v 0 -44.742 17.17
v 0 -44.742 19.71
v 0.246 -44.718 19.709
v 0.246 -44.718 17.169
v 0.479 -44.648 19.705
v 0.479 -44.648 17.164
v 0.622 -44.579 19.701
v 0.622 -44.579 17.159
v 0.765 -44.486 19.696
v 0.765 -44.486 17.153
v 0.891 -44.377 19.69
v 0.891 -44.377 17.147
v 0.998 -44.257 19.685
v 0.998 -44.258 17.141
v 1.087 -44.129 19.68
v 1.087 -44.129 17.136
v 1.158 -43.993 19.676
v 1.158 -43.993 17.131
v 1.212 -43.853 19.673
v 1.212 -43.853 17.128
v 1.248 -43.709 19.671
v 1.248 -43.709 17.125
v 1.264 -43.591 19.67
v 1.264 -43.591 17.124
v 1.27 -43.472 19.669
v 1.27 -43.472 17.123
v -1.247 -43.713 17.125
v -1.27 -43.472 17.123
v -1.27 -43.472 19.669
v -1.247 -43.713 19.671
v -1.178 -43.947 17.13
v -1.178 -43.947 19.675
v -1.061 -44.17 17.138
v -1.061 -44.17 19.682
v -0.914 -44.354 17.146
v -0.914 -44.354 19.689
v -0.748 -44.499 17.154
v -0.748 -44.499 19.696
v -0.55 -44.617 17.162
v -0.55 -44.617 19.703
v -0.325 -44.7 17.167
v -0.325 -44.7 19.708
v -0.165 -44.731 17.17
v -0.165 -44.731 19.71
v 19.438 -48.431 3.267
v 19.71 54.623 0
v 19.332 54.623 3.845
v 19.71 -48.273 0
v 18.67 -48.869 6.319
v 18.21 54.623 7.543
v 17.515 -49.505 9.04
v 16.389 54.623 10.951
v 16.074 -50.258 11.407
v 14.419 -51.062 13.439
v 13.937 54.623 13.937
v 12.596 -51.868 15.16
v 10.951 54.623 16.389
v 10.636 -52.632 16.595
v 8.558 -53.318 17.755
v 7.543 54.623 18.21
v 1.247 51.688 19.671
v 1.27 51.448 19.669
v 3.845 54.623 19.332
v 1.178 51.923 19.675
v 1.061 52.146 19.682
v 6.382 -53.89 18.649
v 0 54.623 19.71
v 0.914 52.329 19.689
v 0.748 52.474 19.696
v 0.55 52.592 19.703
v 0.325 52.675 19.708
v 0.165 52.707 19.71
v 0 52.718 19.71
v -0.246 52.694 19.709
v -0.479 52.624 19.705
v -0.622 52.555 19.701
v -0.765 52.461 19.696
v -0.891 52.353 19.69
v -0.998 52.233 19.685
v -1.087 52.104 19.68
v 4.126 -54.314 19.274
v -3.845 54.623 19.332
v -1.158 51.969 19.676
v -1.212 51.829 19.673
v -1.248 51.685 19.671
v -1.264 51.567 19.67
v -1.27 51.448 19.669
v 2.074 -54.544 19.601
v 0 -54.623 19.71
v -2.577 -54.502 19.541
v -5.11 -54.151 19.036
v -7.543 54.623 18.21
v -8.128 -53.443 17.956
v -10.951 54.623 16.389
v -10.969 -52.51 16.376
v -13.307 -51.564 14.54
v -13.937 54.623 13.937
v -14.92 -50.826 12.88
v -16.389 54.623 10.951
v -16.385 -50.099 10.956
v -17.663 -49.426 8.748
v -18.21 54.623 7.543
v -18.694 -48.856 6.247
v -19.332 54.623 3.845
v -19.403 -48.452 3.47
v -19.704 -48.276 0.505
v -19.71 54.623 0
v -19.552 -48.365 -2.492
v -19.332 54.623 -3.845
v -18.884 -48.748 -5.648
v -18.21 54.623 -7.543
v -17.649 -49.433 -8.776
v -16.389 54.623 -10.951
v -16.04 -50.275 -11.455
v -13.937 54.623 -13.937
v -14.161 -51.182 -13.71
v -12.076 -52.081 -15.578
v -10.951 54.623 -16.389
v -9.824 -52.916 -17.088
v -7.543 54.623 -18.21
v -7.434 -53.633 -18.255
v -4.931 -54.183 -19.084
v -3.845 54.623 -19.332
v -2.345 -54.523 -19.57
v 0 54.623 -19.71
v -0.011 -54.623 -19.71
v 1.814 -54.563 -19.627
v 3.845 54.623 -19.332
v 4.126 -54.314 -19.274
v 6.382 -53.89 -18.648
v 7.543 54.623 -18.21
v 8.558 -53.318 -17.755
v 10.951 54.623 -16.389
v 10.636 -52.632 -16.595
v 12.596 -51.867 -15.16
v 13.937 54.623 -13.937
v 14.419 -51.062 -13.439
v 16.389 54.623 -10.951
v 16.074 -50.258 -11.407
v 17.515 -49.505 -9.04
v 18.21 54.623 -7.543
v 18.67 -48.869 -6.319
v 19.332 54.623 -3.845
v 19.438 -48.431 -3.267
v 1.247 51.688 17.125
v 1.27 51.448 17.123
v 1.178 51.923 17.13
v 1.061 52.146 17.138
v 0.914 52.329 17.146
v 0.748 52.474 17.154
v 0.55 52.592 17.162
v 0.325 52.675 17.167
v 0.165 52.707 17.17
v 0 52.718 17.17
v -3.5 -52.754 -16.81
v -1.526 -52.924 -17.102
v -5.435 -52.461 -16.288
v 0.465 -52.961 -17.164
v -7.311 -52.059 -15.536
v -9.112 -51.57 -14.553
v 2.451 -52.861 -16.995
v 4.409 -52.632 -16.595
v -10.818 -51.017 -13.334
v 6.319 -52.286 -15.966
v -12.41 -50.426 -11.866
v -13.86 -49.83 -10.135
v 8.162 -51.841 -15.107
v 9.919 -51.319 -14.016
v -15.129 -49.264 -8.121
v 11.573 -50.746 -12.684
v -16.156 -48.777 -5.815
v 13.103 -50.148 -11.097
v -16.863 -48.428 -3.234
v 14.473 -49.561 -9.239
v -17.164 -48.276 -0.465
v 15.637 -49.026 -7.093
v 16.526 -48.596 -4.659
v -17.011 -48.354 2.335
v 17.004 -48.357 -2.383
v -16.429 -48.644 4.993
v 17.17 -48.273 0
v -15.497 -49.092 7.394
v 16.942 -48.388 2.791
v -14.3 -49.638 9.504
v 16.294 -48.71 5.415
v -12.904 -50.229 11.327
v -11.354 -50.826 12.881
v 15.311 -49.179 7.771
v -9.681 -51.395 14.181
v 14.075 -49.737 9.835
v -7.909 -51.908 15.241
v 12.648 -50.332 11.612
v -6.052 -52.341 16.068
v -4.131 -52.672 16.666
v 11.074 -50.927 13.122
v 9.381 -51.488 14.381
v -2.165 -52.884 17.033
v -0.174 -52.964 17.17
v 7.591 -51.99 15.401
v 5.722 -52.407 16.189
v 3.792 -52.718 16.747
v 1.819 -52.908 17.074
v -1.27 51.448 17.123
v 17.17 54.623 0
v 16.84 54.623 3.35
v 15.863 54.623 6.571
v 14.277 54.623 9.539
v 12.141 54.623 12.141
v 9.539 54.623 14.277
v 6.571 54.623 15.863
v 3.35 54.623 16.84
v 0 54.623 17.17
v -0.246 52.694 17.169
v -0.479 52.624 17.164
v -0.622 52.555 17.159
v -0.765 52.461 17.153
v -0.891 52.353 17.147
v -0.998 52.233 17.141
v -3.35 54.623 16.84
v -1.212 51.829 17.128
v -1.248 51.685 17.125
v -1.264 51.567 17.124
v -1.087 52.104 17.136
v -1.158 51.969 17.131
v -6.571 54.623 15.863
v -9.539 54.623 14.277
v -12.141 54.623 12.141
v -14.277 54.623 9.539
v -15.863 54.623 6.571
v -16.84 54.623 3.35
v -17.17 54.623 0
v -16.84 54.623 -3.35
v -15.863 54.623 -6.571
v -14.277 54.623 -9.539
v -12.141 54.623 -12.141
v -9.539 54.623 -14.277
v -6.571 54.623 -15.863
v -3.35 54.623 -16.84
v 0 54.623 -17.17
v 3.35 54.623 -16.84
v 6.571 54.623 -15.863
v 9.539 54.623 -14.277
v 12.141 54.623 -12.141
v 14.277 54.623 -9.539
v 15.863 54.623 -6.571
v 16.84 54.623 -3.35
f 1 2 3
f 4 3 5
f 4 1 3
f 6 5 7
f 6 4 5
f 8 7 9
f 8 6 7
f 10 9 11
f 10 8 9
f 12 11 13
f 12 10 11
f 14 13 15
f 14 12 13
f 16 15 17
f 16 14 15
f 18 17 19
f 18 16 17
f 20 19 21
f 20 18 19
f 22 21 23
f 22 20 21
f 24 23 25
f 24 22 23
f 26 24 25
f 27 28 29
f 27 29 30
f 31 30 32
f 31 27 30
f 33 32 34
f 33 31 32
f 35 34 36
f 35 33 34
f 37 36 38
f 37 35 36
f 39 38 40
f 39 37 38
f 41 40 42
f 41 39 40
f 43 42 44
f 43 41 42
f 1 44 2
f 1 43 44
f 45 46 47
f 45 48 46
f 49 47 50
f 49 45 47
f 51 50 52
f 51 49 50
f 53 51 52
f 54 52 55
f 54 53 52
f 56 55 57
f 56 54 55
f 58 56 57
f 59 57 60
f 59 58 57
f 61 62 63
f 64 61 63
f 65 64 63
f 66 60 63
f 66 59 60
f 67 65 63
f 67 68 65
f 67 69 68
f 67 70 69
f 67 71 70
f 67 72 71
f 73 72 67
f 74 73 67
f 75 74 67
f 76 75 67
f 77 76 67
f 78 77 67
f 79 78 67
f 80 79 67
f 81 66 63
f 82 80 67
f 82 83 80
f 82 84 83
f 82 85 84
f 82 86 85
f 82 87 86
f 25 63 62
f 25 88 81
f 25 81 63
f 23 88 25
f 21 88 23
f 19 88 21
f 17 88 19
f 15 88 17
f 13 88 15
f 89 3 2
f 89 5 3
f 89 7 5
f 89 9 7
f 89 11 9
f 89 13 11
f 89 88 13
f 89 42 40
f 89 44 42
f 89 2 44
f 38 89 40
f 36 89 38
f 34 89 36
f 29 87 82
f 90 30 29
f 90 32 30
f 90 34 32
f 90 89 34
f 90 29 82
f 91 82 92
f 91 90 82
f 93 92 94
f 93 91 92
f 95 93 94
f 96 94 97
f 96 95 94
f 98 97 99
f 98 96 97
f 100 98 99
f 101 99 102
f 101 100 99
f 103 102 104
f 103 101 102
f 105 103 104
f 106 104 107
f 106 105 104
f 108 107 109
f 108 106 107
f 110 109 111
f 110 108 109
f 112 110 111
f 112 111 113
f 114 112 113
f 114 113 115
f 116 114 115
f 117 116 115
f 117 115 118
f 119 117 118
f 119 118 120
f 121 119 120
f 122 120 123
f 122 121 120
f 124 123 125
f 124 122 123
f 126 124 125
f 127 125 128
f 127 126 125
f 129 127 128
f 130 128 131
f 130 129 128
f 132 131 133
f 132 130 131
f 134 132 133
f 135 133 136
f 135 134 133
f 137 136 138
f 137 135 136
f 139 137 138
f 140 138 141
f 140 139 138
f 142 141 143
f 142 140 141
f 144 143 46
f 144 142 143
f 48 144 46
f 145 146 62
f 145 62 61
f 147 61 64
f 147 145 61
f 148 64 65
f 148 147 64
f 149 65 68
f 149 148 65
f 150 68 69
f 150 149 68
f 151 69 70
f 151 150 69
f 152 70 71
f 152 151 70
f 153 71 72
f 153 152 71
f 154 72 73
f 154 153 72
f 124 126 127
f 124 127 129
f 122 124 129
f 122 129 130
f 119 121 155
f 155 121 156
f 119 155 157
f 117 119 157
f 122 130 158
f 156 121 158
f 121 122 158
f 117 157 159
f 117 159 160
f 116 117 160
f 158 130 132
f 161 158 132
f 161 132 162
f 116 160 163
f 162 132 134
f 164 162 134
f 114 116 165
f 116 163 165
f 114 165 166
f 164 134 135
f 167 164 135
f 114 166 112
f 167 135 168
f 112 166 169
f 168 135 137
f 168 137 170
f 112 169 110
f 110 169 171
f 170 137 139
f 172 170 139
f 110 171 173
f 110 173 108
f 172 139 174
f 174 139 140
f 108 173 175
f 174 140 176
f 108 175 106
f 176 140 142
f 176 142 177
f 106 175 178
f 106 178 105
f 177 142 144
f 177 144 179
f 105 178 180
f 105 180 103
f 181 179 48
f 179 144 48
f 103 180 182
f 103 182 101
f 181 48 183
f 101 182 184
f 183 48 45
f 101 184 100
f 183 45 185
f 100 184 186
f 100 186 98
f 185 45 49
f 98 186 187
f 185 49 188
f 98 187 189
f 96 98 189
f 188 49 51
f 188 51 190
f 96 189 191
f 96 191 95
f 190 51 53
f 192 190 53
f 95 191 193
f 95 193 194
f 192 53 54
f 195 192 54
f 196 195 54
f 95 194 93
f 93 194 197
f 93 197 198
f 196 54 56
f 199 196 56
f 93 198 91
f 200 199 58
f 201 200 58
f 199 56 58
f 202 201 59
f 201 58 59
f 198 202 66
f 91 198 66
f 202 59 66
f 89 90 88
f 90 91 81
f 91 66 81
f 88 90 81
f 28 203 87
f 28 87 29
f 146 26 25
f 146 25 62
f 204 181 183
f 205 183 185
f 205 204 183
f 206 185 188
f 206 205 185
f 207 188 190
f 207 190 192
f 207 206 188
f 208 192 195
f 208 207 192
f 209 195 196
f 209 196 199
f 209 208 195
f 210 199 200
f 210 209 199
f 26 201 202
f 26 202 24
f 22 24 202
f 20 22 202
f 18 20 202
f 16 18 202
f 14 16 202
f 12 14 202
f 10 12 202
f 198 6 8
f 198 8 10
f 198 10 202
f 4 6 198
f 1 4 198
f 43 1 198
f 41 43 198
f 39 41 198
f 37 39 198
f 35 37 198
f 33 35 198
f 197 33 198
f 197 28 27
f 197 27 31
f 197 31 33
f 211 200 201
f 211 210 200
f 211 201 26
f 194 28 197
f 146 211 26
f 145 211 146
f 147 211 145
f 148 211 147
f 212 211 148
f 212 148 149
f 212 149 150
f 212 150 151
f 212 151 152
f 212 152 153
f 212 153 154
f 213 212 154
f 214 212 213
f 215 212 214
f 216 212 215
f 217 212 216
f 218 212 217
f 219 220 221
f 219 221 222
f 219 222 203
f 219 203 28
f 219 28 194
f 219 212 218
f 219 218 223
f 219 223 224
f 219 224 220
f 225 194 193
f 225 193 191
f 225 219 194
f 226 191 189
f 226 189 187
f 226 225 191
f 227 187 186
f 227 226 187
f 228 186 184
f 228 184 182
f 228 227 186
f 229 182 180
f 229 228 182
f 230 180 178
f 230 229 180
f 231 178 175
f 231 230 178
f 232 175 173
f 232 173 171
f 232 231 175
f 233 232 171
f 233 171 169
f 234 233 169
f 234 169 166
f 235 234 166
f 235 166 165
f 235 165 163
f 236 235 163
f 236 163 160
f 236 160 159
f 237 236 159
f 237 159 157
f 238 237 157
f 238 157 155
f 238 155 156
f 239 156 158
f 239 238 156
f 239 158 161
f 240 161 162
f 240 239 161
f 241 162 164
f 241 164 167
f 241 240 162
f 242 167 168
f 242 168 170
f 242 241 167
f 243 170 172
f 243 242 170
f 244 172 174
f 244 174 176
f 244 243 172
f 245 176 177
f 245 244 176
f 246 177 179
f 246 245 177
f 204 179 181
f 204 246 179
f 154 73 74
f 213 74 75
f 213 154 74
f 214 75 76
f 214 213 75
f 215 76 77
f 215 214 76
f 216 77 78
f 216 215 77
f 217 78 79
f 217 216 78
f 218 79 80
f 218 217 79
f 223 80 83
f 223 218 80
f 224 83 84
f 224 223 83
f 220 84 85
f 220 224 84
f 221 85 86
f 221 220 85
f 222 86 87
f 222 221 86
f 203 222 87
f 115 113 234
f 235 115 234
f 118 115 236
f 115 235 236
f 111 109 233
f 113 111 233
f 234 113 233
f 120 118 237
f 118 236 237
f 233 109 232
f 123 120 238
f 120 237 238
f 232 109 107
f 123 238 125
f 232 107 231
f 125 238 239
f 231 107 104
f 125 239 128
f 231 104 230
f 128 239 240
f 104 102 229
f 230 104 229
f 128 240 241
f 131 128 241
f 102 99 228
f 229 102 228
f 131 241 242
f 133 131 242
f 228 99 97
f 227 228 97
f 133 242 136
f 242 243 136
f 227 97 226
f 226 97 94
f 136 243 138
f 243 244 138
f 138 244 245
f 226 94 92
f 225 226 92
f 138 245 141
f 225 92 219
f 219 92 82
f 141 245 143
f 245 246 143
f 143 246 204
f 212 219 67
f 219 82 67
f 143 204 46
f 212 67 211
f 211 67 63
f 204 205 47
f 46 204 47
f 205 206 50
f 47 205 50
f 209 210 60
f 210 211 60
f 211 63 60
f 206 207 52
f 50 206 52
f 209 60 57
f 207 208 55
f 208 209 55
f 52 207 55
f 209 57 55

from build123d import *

# Parameters (mm, degrees)
F0_R     = 19.7104
F0_R_2   = 17.1704
F1_DEPTH = 54.6227
F3_DEPTH = 19.7114
F5_DEPTH = 25.4


with BuildPart() as f1:
    # F0 (on Front) → F1 (new body, symmetric)
    with BuildSketch(Plane.XZ):
        Circle(F0_R)
        Circle(F0_R_2, mode=Mode.SUBTRACT)
    extrude(amount=F1_DEPTH, both=True)

    # F2 (on Top) → F3 (cut, through all)
    with BuildSketch(Plane.XY):
        with BuildLine():
            ThreePointArc((0, 52.7177), (-0.898026, 52.345726), (-1.27, 51.4477))
            Line((-1.27, 51.4477), (-1.27, -43.4721))
            ThreePointArc((-1.27, -43.4721), (-0.898026, -44.370126), (0, -44.7421))
            ThreePointArc((0, -44.7421), (0.898026, -44.370126), (1.27, -43.4721))
            Line((1.27, -43.4721), (1.27, 51.4477))
            ThreePointArc((1.27, 51.4477), (0.898026, 52.345726), (0, 52.7177))
        make_face()
    extrude(amount=F3_DEPTH, mode=Mode.SUBTRACT)

    # F4 (on Right) → F5 (cut, symmetric)
    with BuildSketch(Plane.YZ):
        with BuildLine():
            Line((-54.6227, 19.7104), (-54.6227, -19.7104))
            ThreePointArc((-54.6227, -19.7104), (-48.2727, 0), (-54.6227, 19.7104))
        make_face()
    extrude(amount=F5_DEPTH, both=True, mode=Mode.SUBTRACT)


solid = f1.part
